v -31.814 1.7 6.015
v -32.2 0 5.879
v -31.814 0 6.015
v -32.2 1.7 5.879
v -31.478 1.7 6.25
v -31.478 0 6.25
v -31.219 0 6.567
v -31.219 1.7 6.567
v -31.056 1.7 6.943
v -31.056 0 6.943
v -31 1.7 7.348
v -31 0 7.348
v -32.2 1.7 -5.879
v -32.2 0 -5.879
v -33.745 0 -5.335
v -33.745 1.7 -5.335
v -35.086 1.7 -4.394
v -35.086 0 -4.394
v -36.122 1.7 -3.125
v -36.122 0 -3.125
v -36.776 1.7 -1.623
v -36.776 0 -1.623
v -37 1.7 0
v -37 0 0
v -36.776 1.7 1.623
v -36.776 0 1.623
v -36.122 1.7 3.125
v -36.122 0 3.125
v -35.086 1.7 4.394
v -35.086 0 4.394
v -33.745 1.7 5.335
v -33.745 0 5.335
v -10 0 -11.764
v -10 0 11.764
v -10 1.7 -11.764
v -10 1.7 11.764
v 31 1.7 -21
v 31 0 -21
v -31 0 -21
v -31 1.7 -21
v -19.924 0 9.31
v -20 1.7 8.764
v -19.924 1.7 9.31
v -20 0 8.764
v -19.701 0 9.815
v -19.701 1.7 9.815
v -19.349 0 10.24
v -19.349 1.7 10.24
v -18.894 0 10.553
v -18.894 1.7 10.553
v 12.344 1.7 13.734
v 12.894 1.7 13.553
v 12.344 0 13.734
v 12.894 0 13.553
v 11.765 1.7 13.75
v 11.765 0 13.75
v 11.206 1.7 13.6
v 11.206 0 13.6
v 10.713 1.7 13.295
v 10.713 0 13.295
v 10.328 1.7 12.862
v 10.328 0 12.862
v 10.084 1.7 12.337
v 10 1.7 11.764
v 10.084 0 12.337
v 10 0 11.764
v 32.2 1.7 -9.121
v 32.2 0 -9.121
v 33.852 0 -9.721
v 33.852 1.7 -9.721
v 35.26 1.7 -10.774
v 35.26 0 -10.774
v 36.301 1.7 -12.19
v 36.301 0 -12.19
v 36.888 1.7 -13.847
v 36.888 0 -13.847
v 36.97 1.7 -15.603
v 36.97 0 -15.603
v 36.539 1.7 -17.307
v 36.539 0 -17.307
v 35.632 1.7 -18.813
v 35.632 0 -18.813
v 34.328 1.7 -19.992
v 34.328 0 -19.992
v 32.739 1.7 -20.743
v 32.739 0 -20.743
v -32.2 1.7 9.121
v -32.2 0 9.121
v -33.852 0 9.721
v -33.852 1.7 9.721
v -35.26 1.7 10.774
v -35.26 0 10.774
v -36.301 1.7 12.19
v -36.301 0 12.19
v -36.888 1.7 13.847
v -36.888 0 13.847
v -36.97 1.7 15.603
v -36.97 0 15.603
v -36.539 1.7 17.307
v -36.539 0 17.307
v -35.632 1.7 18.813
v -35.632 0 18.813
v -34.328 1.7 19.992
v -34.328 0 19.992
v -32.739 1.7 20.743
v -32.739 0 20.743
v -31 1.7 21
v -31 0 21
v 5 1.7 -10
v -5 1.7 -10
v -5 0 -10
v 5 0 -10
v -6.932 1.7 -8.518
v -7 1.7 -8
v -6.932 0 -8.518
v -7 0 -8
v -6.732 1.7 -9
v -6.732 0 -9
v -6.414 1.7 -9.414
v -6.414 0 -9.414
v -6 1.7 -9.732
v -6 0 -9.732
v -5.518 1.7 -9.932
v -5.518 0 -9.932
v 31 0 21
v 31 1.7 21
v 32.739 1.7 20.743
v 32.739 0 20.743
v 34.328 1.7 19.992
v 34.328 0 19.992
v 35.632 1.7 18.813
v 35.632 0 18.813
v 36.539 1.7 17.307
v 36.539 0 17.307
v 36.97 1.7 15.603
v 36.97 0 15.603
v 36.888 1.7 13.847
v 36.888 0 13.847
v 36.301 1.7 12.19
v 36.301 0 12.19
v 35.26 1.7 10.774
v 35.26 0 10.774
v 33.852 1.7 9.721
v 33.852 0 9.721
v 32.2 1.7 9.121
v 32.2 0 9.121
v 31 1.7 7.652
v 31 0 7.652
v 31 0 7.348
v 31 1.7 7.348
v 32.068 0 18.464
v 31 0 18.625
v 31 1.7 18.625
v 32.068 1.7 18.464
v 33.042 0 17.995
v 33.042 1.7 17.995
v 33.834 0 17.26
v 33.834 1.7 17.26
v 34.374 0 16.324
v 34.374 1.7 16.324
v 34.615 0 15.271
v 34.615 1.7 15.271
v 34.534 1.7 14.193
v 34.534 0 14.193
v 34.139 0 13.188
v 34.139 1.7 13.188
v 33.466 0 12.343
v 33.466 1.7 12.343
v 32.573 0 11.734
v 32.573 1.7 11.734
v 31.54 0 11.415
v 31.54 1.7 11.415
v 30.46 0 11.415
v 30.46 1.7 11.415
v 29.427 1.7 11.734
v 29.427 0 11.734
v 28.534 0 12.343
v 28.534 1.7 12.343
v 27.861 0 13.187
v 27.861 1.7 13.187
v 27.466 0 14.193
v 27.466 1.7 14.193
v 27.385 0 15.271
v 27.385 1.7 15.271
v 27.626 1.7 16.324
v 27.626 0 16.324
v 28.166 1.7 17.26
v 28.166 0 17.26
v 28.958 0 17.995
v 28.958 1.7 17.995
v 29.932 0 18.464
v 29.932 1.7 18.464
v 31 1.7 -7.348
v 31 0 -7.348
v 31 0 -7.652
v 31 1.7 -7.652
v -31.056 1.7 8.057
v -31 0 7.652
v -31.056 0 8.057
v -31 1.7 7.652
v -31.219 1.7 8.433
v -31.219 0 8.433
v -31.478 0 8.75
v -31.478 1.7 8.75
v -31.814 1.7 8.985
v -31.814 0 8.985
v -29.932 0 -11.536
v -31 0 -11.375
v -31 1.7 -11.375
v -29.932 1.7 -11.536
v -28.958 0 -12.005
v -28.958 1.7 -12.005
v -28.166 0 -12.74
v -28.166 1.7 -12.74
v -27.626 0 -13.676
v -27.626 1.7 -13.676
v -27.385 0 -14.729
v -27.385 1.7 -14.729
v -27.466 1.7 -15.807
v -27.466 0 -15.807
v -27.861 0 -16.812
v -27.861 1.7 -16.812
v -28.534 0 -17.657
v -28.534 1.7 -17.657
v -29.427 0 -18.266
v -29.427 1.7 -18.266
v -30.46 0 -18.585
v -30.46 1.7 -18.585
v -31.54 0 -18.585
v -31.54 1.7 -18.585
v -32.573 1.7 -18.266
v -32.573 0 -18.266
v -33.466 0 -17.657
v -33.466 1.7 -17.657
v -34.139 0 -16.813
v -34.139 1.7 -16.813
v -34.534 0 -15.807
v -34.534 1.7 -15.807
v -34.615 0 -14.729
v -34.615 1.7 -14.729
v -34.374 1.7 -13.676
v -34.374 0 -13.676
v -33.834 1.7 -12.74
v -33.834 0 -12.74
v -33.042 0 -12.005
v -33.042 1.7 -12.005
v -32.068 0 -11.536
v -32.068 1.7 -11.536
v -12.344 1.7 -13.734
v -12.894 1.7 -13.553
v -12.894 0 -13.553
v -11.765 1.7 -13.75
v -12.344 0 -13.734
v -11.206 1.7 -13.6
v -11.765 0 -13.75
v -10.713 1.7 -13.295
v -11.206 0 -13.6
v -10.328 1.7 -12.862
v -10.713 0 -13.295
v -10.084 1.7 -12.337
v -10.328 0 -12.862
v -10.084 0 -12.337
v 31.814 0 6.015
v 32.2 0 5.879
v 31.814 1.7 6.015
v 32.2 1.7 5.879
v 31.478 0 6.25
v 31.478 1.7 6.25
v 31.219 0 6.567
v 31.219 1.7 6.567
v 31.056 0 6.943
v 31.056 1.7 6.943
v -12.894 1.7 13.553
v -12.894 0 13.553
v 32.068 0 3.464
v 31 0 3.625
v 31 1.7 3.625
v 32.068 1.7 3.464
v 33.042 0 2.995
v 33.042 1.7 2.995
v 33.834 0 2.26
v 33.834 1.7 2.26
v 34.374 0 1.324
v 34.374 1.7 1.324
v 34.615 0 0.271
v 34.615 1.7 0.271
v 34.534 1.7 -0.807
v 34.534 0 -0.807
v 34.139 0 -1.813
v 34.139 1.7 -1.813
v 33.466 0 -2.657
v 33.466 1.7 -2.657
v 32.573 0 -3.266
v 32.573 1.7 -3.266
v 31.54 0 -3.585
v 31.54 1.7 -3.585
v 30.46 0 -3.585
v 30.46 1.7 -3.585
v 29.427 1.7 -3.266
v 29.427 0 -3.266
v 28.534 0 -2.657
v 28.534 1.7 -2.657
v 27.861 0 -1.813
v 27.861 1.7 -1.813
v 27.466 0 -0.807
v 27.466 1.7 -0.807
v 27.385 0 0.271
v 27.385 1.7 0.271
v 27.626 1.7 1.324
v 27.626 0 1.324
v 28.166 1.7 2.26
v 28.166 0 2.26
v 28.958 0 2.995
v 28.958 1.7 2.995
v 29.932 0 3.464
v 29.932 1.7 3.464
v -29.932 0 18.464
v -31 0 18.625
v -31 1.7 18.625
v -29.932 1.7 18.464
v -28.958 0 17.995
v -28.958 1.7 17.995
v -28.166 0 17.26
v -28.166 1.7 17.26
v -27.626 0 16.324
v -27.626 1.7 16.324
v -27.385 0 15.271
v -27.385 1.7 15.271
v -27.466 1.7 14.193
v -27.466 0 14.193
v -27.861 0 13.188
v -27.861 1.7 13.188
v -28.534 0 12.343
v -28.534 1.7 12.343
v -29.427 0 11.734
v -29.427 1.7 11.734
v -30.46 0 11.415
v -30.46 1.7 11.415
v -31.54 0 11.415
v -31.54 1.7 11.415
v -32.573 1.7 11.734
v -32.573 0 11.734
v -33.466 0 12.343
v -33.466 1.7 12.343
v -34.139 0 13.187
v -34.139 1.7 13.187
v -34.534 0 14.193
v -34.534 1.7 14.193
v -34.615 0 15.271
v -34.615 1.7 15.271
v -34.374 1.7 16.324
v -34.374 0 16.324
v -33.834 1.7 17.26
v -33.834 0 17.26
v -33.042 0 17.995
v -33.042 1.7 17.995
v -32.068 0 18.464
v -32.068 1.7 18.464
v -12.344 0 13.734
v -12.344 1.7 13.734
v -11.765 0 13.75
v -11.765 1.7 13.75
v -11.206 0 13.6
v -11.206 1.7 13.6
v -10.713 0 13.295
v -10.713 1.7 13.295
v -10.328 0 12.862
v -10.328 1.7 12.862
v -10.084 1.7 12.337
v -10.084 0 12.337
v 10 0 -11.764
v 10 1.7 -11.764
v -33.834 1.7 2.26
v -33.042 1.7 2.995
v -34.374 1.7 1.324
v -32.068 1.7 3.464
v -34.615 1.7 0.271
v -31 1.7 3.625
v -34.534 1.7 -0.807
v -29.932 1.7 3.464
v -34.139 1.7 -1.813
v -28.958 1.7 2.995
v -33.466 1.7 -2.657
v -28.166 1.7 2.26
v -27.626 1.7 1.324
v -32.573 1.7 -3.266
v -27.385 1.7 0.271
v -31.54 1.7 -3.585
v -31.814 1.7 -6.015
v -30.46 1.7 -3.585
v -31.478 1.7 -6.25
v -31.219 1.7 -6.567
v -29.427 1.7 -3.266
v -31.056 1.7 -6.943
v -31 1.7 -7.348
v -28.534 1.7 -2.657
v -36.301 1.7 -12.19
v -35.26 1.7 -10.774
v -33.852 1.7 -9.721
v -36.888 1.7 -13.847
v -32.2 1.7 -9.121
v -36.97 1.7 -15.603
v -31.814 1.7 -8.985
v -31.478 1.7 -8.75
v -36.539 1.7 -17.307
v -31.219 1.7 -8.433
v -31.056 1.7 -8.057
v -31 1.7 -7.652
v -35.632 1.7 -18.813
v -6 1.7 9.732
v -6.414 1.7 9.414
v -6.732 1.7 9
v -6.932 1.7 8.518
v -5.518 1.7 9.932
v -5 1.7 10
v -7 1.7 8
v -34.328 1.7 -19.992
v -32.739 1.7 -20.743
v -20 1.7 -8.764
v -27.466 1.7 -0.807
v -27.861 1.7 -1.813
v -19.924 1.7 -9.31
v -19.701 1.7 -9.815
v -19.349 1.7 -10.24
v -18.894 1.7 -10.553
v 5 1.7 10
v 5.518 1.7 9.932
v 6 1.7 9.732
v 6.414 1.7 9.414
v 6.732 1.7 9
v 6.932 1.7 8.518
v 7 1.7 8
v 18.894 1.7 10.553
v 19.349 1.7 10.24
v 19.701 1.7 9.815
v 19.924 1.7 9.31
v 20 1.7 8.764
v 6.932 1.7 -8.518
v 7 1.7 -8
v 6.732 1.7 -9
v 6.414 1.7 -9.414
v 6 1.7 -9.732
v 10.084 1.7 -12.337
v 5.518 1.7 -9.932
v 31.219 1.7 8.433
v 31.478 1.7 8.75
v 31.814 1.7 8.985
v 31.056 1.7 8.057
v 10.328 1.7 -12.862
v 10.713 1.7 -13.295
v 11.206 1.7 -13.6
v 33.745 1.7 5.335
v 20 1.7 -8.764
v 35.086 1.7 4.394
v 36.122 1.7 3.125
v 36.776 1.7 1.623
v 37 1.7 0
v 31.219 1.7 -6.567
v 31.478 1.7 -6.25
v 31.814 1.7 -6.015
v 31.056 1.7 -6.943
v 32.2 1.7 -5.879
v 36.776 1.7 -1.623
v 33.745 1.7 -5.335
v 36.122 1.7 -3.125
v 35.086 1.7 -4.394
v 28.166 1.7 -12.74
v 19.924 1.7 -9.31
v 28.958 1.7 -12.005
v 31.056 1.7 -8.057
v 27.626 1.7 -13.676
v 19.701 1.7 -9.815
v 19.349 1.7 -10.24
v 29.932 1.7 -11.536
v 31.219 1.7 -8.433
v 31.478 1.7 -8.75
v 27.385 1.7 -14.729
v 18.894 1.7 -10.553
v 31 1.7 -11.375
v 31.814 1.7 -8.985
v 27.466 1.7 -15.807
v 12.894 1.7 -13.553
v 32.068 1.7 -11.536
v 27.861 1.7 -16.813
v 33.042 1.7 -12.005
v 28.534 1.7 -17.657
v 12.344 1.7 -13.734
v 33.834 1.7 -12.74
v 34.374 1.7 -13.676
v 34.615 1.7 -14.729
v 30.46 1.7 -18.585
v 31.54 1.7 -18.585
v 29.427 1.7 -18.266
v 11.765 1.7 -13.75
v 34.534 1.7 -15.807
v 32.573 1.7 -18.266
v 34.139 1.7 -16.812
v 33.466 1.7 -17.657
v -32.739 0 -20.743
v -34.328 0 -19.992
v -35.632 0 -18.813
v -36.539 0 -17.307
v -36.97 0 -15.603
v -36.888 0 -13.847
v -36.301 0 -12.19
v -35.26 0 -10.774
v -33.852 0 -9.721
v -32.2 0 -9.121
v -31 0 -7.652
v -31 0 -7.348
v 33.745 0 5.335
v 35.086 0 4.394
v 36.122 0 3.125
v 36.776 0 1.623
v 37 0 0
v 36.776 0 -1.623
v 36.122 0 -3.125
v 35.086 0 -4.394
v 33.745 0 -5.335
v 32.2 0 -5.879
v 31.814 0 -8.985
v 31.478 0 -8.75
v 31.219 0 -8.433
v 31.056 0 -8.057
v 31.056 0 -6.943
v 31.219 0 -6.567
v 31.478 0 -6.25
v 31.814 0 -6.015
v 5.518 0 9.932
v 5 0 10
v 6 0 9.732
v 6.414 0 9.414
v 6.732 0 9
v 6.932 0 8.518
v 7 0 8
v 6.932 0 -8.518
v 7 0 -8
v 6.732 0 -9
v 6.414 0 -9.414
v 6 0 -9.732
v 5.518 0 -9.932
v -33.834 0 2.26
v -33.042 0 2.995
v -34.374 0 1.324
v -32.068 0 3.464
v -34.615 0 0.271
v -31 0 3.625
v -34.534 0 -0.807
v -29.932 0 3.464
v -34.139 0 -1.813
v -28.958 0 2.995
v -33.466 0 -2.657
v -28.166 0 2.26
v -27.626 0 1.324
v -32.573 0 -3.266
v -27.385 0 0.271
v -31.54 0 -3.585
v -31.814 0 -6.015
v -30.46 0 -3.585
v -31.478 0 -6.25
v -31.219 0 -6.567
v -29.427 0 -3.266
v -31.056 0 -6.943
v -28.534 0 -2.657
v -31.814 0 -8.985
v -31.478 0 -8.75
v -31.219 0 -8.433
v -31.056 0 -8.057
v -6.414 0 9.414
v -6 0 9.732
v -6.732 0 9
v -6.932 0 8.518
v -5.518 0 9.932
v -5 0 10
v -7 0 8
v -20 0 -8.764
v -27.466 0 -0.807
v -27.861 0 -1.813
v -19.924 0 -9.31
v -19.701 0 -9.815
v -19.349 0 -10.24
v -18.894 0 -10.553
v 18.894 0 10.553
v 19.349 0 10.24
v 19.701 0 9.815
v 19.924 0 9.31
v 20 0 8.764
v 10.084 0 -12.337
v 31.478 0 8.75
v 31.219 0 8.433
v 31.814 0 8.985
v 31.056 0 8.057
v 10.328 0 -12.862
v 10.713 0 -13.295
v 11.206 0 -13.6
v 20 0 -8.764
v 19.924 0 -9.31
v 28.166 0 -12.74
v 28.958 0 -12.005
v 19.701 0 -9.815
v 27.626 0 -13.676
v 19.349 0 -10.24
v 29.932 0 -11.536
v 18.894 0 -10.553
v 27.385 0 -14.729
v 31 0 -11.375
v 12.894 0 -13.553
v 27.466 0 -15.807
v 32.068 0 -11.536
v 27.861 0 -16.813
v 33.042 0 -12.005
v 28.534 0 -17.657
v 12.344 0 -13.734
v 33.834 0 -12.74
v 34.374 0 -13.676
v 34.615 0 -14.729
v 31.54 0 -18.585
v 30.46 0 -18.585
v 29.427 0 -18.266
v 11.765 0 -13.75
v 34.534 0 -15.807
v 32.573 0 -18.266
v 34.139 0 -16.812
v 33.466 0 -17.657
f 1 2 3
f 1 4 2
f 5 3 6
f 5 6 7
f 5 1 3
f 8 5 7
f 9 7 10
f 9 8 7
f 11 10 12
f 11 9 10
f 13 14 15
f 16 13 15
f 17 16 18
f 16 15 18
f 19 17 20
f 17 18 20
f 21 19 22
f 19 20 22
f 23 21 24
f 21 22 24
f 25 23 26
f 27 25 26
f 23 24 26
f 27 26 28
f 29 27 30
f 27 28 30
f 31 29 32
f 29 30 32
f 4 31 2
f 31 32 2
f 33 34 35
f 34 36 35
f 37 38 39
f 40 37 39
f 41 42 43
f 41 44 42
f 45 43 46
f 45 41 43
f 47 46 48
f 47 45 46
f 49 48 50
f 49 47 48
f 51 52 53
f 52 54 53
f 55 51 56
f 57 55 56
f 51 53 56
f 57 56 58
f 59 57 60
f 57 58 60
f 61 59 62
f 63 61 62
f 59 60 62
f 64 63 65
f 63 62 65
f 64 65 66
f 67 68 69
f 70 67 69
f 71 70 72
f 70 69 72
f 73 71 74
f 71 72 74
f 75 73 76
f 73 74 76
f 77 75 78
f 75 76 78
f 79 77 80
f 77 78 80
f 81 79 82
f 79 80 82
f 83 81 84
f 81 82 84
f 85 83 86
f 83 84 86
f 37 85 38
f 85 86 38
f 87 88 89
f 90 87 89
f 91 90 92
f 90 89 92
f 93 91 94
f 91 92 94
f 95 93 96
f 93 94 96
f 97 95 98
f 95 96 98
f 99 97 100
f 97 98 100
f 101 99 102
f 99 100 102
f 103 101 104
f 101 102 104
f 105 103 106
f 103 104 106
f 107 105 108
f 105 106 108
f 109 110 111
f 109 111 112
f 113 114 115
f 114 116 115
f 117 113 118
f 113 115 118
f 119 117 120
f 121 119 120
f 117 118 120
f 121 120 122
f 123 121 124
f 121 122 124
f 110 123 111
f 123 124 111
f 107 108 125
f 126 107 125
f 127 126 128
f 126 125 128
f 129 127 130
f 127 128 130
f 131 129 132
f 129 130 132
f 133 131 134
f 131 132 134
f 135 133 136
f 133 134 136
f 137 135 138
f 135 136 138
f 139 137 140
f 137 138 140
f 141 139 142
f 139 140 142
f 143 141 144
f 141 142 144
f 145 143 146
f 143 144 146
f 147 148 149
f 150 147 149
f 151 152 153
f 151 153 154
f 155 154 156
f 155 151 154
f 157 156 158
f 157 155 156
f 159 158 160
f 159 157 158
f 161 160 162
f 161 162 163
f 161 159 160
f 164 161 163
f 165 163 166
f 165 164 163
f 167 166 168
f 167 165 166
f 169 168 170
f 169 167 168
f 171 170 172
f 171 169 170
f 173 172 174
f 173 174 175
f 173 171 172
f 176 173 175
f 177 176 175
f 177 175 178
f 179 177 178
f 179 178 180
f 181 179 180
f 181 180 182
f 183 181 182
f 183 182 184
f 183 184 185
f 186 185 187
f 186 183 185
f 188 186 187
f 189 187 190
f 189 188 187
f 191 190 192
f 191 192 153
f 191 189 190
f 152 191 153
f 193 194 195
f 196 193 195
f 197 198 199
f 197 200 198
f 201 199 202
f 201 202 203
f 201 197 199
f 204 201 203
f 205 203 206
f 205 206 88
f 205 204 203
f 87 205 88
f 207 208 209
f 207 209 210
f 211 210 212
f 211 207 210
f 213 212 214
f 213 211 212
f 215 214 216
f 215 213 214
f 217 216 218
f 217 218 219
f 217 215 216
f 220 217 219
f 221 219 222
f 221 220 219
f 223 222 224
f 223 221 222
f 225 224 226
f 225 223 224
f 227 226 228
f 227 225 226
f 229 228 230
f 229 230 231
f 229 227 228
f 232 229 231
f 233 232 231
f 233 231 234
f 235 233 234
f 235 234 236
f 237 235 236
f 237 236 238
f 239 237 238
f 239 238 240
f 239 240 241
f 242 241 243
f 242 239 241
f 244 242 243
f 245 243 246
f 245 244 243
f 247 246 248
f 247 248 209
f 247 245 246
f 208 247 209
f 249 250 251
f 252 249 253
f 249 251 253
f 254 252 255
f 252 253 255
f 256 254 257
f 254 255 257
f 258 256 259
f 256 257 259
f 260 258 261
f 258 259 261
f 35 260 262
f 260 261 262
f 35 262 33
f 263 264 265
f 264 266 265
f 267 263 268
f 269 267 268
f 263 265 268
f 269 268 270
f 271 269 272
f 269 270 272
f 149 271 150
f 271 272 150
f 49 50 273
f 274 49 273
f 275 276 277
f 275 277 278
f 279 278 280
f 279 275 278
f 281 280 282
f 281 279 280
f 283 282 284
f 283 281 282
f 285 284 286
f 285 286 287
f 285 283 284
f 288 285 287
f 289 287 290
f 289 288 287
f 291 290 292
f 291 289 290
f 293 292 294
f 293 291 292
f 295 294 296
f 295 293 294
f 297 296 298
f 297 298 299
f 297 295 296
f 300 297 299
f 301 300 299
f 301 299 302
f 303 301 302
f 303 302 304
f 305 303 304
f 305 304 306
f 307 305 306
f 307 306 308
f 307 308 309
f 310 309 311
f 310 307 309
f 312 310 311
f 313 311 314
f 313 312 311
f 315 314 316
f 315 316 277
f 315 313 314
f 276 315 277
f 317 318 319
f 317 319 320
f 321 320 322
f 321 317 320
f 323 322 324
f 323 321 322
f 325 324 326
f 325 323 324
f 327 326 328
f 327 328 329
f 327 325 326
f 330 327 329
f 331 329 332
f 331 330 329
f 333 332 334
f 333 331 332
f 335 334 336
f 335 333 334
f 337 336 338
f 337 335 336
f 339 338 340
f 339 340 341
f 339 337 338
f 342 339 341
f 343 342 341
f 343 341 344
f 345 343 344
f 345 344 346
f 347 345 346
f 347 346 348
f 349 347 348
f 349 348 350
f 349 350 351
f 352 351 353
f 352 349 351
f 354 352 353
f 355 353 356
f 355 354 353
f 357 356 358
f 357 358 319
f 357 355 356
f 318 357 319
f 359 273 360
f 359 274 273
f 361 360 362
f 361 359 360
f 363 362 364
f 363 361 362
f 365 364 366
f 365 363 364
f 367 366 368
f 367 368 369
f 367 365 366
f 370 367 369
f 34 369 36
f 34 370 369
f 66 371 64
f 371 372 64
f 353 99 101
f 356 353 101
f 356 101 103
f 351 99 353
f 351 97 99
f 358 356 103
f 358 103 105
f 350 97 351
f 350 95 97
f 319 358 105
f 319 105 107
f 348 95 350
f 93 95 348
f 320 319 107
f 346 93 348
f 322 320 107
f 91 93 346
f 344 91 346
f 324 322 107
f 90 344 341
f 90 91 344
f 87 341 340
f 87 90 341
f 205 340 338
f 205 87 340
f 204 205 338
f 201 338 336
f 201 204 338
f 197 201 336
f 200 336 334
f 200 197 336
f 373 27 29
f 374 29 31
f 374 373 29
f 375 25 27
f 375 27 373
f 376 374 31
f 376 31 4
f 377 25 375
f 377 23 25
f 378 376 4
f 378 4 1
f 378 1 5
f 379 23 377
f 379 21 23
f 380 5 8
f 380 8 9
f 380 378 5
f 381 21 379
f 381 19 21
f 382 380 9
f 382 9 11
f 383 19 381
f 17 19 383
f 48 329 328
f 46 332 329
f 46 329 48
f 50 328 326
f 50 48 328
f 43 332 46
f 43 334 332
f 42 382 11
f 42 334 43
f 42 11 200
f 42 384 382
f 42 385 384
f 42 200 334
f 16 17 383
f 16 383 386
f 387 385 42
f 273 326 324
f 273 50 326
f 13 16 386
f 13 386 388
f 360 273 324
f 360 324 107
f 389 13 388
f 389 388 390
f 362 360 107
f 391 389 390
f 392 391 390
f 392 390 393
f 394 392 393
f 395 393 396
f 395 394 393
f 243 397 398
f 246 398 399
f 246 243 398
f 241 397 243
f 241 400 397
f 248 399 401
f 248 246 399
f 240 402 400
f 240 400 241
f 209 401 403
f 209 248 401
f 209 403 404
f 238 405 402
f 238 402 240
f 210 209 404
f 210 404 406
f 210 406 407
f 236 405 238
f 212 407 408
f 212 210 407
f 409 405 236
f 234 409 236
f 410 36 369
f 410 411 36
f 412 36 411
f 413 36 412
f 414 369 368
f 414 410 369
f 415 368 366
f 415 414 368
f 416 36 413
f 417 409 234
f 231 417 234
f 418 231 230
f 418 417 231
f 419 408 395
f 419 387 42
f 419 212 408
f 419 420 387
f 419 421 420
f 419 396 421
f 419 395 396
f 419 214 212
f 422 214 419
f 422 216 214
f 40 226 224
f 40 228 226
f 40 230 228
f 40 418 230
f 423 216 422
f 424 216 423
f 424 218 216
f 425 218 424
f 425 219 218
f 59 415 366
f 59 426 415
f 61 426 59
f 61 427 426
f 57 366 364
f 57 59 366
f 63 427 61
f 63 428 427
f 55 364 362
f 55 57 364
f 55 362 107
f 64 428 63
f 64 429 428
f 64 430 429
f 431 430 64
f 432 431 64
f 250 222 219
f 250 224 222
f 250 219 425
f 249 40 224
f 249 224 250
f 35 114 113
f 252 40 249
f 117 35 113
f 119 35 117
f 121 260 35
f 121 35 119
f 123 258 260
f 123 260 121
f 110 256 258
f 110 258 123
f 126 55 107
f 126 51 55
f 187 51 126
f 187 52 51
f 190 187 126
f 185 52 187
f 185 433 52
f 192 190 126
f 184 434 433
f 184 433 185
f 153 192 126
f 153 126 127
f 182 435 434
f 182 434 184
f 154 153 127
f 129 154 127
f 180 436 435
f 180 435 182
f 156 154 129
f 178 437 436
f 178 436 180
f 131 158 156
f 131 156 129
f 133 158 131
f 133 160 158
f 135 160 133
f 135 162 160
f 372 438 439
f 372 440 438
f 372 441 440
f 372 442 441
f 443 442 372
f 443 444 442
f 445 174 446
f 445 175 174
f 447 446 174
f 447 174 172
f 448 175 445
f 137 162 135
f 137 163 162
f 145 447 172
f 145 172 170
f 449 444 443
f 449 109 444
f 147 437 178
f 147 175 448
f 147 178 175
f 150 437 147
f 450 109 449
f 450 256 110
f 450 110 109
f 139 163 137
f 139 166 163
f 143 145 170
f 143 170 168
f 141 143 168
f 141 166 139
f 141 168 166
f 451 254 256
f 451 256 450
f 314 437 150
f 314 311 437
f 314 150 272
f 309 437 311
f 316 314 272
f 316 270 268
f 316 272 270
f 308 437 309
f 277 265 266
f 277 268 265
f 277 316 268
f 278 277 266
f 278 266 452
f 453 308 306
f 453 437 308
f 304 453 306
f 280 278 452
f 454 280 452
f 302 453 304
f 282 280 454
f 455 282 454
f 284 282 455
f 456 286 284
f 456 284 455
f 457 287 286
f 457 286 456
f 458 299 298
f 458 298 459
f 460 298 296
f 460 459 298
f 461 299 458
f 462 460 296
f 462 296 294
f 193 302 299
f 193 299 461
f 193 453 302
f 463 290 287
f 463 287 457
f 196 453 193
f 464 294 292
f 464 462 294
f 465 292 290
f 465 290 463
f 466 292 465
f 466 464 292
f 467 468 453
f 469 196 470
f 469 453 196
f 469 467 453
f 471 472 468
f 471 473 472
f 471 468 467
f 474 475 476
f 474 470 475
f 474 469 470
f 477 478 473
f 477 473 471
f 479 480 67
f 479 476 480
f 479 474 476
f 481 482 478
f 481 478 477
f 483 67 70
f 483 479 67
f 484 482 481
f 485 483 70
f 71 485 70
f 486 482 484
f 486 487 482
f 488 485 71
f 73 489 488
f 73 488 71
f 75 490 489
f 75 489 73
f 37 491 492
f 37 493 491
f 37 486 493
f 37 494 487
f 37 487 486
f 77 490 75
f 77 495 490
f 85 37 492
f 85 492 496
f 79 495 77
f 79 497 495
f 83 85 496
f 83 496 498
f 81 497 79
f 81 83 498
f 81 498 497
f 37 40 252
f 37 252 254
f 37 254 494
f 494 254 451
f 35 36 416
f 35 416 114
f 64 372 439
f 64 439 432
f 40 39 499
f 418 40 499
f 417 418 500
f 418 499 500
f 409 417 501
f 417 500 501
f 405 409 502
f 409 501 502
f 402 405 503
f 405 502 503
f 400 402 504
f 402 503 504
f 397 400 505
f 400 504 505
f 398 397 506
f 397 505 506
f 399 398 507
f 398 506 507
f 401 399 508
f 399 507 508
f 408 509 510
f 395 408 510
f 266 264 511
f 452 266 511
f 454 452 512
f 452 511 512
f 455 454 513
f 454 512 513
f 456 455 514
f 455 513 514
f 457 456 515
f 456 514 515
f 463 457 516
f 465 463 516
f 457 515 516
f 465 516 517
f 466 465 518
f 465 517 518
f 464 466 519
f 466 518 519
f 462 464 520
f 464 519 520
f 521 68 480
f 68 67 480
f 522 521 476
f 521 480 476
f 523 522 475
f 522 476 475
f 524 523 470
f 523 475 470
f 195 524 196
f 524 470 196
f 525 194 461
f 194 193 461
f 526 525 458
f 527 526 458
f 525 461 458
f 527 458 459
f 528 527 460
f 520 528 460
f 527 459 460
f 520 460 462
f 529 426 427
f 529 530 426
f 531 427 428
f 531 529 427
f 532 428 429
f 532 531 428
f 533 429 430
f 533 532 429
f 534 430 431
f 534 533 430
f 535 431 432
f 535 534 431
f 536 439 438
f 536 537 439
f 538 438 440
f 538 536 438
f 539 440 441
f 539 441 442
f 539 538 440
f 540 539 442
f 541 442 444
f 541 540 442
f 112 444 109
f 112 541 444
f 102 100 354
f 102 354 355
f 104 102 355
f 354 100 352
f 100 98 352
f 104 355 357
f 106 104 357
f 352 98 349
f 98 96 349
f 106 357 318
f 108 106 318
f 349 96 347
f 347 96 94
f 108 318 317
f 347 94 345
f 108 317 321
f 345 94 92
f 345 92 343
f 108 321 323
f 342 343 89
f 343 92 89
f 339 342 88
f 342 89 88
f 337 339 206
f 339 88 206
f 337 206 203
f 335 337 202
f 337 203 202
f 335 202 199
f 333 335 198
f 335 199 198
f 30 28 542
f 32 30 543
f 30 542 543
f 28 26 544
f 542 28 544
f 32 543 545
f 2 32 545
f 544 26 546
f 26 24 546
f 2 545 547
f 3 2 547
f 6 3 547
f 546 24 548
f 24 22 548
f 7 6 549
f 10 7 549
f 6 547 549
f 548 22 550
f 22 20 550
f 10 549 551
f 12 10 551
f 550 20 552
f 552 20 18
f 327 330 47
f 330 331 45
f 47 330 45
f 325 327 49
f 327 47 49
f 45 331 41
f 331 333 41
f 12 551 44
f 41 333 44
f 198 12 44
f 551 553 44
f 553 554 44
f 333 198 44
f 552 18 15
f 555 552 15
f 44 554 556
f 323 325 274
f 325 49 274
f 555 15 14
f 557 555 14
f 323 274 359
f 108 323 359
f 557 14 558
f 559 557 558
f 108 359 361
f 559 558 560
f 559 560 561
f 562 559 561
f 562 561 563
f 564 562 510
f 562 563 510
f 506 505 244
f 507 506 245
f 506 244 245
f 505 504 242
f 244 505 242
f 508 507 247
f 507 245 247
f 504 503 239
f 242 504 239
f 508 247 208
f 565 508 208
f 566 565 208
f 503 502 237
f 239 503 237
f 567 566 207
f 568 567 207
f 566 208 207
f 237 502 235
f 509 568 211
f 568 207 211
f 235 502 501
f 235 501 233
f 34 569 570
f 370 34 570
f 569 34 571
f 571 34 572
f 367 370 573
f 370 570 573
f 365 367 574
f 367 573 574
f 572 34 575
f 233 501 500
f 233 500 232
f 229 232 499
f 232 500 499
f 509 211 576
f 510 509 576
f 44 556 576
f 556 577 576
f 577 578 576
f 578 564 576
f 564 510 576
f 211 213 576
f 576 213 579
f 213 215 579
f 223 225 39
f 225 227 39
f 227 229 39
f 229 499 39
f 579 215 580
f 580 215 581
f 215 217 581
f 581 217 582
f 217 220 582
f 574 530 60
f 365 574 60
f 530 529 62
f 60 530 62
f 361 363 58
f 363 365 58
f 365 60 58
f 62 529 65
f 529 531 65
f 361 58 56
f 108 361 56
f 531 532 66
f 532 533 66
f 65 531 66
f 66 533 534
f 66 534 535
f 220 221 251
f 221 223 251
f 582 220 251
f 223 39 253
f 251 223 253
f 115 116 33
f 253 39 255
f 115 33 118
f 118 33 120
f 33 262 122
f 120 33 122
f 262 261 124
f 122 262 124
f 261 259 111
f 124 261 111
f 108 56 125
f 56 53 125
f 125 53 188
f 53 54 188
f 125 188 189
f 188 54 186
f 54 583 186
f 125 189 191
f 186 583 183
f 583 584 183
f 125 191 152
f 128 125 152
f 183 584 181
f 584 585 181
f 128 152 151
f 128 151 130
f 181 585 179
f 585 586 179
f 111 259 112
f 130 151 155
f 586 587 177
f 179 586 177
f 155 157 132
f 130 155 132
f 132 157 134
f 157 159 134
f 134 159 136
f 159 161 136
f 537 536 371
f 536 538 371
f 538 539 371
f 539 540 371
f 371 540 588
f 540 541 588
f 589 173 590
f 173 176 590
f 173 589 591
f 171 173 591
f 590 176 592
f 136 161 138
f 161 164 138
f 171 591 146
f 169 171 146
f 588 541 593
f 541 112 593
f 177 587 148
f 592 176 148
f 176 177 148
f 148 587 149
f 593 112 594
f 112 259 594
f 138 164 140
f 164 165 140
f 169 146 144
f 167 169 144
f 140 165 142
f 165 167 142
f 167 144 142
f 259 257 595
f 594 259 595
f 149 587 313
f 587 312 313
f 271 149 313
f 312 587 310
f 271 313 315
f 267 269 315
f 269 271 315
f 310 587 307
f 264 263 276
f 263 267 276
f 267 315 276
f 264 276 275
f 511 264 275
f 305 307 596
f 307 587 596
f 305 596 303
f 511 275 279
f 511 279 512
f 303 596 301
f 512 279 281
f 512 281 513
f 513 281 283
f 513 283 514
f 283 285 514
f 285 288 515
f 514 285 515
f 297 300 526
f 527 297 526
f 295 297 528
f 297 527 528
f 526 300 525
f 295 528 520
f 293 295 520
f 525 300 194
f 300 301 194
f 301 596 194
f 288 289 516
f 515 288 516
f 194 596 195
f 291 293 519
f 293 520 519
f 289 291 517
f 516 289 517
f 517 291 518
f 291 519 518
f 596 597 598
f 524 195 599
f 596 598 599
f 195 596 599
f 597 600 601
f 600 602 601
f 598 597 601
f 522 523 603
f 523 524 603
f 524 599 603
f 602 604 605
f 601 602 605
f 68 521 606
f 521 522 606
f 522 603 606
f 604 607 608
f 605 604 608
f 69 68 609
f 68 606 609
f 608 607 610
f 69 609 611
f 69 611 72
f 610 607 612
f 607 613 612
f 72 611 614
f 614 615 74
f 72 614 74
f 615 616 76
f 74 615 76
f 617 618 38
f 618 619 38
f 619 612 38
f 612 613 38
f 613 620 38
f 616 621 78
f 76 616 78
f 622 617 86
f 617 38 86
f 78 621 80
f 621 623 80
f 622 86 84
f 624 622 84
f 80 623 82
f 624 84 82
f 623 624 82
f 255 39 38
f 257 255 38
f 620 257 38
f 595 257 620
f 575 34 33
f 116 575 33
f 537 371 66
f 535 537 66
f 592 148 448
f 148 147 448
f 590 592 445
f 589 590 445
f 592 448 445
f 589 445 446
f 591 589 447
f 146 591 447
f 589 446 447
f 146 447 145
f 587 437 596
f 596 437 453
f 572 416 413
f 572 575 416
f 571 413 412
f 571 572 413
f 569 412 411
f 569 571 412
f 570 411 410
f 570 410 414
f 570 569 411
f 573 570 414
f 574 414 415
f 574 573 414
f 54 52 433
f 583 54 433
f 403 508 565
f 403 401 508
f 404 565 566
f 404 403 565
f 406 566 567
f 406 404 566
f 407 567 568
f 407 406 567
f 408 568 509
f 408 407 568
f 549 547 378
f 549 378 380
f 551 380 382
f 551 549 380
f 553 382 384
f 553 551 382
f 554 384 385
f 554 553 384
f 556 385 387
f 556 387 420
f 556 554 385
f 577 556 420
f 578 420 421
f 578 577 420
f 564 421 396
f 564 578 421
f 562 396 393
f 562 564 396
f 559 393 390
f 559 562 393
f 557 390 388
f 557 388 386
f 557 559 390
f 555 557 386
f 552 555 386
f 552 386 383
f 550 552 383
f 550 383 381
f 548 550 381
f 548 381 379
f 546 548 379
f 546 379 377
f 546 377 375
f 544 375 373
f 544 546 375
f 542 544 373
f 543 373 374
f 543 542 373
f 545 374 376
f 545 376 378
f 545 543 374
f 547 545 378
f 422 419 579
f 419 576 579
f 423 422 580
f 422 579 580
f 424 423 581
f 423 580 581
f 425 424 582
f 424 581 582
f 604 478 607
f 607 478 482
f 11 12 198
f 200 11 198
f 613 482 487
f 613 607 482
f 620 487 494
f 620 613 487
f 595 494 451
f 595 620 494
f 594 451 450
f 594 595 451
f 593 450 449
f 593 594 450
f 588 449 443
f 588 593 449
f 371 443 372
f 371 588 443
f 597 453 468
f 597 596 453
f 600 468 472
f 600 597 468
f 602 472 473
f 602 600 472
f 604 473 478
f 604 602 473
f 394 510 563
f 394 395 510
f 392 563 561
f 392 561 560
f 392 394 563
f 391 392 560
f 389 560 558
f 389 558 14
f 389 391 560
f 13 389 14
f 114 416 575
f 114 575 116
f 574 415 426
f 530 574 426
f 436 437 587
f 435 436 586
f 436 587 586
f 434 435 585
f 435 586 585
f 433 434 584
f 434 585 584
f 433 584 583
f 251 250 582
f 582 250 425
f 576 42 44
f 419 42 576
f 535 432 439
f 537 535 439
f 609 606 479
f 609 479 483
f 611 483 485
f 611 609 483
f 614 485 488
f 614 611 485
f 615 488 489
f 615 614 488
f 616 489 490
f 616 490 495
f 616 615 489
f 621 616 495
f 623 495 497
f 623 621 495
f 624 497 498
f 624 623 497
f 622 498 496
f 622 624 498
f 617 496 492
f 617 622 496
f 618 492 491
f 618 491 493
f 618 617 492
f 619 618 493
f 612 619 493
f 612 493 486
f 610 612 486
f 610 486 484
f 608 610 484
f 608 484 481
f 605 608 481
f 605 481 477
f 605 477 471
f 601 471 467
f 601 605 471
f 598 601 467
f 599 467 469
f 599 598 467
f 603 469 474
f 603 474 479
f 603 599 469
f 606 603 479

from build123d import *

# Parameters (mm, degrees)
SKETCH1_R           = 6
SKETCH1_R_2         = 3.625
BOSS_EXTRUDE1_DEPTH = 1.7
CUT_EXTRUDE1_REACH  = 44.578
SKETCH2_W           = 10
SKETCH2_H           = 20
SKETCH2_W_2         = 14
FILLET1_R           = 1.5
FILLET2_R           = 2


with BuildPart() as part:
    # Sketch1 → Boss-Extrude1 (new body)
    # profile 1 of 7: a face of its own
    with BuildSketch(Plane(origin=(0, 0, 0), x_dir=(1, 0, 0), z_dir=(0, 1, 0))):
        with BuildLine():
            Line((31, 21), (-31, 21))
            ThreePointArc((-31, 21), (-26.757359313, 19.242640687), (-25, 15))
            ThreePointArc((-25, 15), (-26.757359313, 10.757359313), (-31, 9))
            Line((-31, 9), (-31, 6))
            ThreePointArc((-31, 6), (-26.757359313, 4.242640687), (-25, 0))
            ThreePointArc((-25, 0), (-26.757359313, -4.242640687), (-31, -6))
            Line((-31, -6), (-31, -9))
            ThreePointArc((-31, -9), (-26.757359313, -10.757359313), (-25, -15))
            ThreePointArc((-25, -15), (-26.757359313, -19.242640687), (-31, -21))
            Line((-31, -21), (31, -21))
            ThreePointArc((31, -21), (25, -15), (31, -9))
            Line((31, -9), (31, -6))
            ThreePointArc((31, -6), (25, 0), (31, 6))
            Line((31, 6), (31, 9))
            ThreePointArc((31, 9), (25, 15), (31, 21))
        make_face()
    # profile 2 of 7: a face of its own
    with BuildSketch(Plane(origin=(0, 0, 0), x_dir=(1, 0, 0), z_dir=(0, 1, 0))):
        with Locations((-31, 15)):
            Circle(SKETCH1_R)
        with Locations(Location((-31, 15, 0), (0, 0, 270))):
            Circle(SKETCH1_R_2, mode=Mode.SUBTRACT)
    # profile 3 of 7: a face of its own
    with BuildSketch(Plane(origin=(0, 0, 0), x_dir=(1, 0, 0), z_dir=(0, 1, 0))):
        with Locations((-31, 0)):
            Circle(SKETCH1_R)
        with Locations(Location((-31, 0, 0), (0, 0, 270))):
            Circle(SKETCH1_R_2, mode=Mode.SUBTRACT)
    # profile 4 of 7: a face of its own
    with BuildSketch(Plane(origin=(0, 0, 0), x_dir=(1, 0, 0), z_dir=(0, 1, 0))):
        with Locations((-31, -15)):
            Circle(SKETCH1_R)
        with Locations(Location((-31, -15, 0), (0, 0, 270))):
            Circle(SKETCH1_R_2, mode=Mode.SUBTRACT)
    # profile 5 of 7: a face of its own
    with BuildSketch(Plane(origin=(0, 0, 0), x_dir=(1, 0, 0), z_dir=(0, 1, 0))):
        with Locations((31, -15)):
            Circle(SKETCH1_R)
        with Locations(Location((31, -15, 0), (0, 0, 270))):
            Circle(SKETCH1_R_2, mode=Mode.SUBTRACT)
    # profile 6 of 7: a face of its own
    with BuildSketch(Plane(origin=(0, 0, 0), x_dir=(1, 0, 0), z_dir=(0, 1, 0))):
        with Locations((31, 0)):
            Circle(SKETCH1_R)
        with Locations(Location((31, 0, 0), (0, 0, 270))):
            Circle(SKETCH1_R_2, mode=Mode.SUBTRACT)
    # profile 7 of 7: a face of its own
    with BuildSketch(Plane(origin=(0, 0, 0), x_dir=(1, 0, 0), z_dir=(0, 1, 0))):
        with Locations((31, 15)):
            Circle(SKETCH1_R)
        with Locations(Location((31, 15, 0), (0, 0, 270))):
            Circle(SKETCH1_R_2, mode=Mode.SUBTRACT)
    extrude(amount=BOSS_EXTRUDE1_DEPTH)

    # Sketch2 → Cut-Extrude1 (cut, up to next)
    with BuildSketch(Plane(origin=(0, 1.7, 0), x_dir=(1, 0, 0), z_dir=(0, 1, 0)), mode=Mode.PRIVATE) as cut_extrude1_sk1:
        with Locations((-15, 0)):
            Rectangle(SKETCH2_W, SKETCH2_H)
    cut_extrude1_tool1 = extrude(cut_extrude1_sk1.sketch, amount=-CUT_EXTRUDE1_REACH, mode=Mode.PRIVATE) & part.part
    # Sketch2 → Cut-Extrude1 (cut, up to next)
    with BuildSketch(Plane(origin=(0, 1.7, 0), x_dir=(1, 0, 0), z_dir=(0, 1, 0)), mode=Mode.PRIVATE) as cut_extrude1_sk2:
        Polygon((-10, 10), (-10, 15), (-20, 10), align=None)
    cut_extrude1_tool2 = extrude(cut_extrude1_sk2.sketch, amount=-CUT_EXTRUDE1_REACH, mode=Mode.PRIVATE) & part.part
    # Sketch2 → Cut-Extrude1 (cut, up to next)
    with BuildSketch(Plane(origin=(0, 1.7, 0), x_dir=(1, 0, 0), z_dir=(0, 1, 0)), mode=Mode.PRIVATE) as cut_extrude1_sk3:
        Polygon((-10, -15), (-10, -10), (-20, -10), align=None)
    cut_extrude1_tool3 = extrude(cut_extrude1_sk3.sketch, amount=-CUT_EXTRUDE1_REACH, mode=Mode.PRIVATE) & part.part
    # Sketch2 → Cut-Extrude1 (cut, up to next)
    with BuildSketch(Plane(origin=(0, 1.7, 0), x_dir=(1, 0, 0), z_dir=(0, 1, 0)), mode=Mode.PRIVATE) as cut_extrude1_sk4:
        Polygon((10, -15), (20, -10), (10, -10), align=None)
    cut_extrude1_tool4 = extrude(cut_extrude1_sk4.sketch, amount=-CUT_EXTRUDE1_REACH, mode=Mode.PRIVATE) & part.part
    # Sketch2 → Cut-Extrude1 (cut, up to next)
    with BuildSketch(Plane(origin=(0, 1.7, 0), x_dir=(1, 0, 0), z_dir=(0, 1, 0)), mode=Mode.PRIVATE) as cut_extrude1_sk5:
        with Locations((15, 0)):
            Rectangle(SKETCH2_W, SKETCH2_H)
    cut_extrude1_tool5 = extrude(cut_extrude1_sk5.sketch, amount=-CUT_EXTRUDE1_REACH, mode=Mode.PRIVATE) & part.part
    # Sketch2 → Cut-Extrude1 (cut, up to next)
    with BuildSketch(Plane(origin=(0, 1.7, 0), x_dir=(1, 0, 0), z_dir=(0, 1, 0)), mode=Mode.PRIVATE) as cut_extrude1_sk6:
        Polygon((20, 10), (10, 15), (10, 10), align=None)
    cut_extrude1_tool6 = extrude(cut_extrude1_sk6.sketch, amount=-CUT_EXTRUDE1_REACH, mode=Mode.PRIVATE) & part.part
    # Sketch2 → Cut-Extrude1 (cut, up to next)
    with BuildSketch(Plane(origin=(0, 1.7, 0), x_dir=(1, 0, 0), z_dir=(0, 1, 0)), mode=Mode.PRIVATE) as cut_extrude1_sk7:
        Rectangle(SKETCH2_W_2, SKETCH2_H)
    cut_extrude1_tool7 = extrude(cut_extrude1_sk7.sketch, amount=-CUT_EXTRUDE1_REACH, mode=Mode.PRIVATE) & part.part
    add(cut_extrude1_tool1.solids().sort_by_distance((-15, 1.7, 0))[0], mode=Mode.SUBTRACT)
    add(cut_extrude1_tool2.solids().sort_by_distance((-13.333333, 1.7, -11.666667))[0], mode=Mode.SUBTRACT)
    add(cut_extrude1_tool3.solids().sort_by_distance((-13.333333, 1.7, 11.666667))[0], mode=Mode.SUBTRACT)
    add(cut_extrude1_tool4.solids().sort_by_distance((13.333333, 1.7, 11.666667))[0], mode=Mode.SUBTRACT)
    add(cut_extrude1_tool5.solids().sort_by_distance((15, 1.7, 0))[0], mode=Mode.SUBTRACT)
    add(cut_extrude1_tool6.solids().sort_by_distance((13.333333, 1.7, -11.666667))[0], mode=Mode.SUBTRACT)
    add(cut_extrude1_tool7.solids().sort_by_distance((0, 1.7, 0))[0], mode=Mode.SUBTRACT)

    # Fillet1
    fillet1_edges = [part.edges().sort_by_distance(p)[0] for p in [
        (31, 0.85, -9),
        (31, 0.85, -6),
        (31, 0.85, 6),
        (31, 0.85, 9),
        (-31, 0.85, 9),
        (-31, 0.85, 6),
        (-31, 0.85, -6),
        (-31, 0.85, -9),
    ]]
    fillet(fillet1_edges, radius=FILLET1_R)

    # Fillet2
    fillet2_edges = [part.edges().sort_by_distance(p)[0] for p in [
        (-20, 0.85, 10),
        (-20, 0.85, -10),
        (-10, 0.85, -15),
        (-10, 0.85, 15),
        (20, 0.85, 10),
        (10, 0.85, 15),
        (10, 0.85, -15),
        (20, 0.85, -10),
        (7, 0.85, -10),
        (7, 0.85, 10),
        (-7, 0.85, 10),
        (-7, 0.85, -10),
    ]]
    fillet(fillet2_edges, radius=FILLET2_R)


solid = part.part
